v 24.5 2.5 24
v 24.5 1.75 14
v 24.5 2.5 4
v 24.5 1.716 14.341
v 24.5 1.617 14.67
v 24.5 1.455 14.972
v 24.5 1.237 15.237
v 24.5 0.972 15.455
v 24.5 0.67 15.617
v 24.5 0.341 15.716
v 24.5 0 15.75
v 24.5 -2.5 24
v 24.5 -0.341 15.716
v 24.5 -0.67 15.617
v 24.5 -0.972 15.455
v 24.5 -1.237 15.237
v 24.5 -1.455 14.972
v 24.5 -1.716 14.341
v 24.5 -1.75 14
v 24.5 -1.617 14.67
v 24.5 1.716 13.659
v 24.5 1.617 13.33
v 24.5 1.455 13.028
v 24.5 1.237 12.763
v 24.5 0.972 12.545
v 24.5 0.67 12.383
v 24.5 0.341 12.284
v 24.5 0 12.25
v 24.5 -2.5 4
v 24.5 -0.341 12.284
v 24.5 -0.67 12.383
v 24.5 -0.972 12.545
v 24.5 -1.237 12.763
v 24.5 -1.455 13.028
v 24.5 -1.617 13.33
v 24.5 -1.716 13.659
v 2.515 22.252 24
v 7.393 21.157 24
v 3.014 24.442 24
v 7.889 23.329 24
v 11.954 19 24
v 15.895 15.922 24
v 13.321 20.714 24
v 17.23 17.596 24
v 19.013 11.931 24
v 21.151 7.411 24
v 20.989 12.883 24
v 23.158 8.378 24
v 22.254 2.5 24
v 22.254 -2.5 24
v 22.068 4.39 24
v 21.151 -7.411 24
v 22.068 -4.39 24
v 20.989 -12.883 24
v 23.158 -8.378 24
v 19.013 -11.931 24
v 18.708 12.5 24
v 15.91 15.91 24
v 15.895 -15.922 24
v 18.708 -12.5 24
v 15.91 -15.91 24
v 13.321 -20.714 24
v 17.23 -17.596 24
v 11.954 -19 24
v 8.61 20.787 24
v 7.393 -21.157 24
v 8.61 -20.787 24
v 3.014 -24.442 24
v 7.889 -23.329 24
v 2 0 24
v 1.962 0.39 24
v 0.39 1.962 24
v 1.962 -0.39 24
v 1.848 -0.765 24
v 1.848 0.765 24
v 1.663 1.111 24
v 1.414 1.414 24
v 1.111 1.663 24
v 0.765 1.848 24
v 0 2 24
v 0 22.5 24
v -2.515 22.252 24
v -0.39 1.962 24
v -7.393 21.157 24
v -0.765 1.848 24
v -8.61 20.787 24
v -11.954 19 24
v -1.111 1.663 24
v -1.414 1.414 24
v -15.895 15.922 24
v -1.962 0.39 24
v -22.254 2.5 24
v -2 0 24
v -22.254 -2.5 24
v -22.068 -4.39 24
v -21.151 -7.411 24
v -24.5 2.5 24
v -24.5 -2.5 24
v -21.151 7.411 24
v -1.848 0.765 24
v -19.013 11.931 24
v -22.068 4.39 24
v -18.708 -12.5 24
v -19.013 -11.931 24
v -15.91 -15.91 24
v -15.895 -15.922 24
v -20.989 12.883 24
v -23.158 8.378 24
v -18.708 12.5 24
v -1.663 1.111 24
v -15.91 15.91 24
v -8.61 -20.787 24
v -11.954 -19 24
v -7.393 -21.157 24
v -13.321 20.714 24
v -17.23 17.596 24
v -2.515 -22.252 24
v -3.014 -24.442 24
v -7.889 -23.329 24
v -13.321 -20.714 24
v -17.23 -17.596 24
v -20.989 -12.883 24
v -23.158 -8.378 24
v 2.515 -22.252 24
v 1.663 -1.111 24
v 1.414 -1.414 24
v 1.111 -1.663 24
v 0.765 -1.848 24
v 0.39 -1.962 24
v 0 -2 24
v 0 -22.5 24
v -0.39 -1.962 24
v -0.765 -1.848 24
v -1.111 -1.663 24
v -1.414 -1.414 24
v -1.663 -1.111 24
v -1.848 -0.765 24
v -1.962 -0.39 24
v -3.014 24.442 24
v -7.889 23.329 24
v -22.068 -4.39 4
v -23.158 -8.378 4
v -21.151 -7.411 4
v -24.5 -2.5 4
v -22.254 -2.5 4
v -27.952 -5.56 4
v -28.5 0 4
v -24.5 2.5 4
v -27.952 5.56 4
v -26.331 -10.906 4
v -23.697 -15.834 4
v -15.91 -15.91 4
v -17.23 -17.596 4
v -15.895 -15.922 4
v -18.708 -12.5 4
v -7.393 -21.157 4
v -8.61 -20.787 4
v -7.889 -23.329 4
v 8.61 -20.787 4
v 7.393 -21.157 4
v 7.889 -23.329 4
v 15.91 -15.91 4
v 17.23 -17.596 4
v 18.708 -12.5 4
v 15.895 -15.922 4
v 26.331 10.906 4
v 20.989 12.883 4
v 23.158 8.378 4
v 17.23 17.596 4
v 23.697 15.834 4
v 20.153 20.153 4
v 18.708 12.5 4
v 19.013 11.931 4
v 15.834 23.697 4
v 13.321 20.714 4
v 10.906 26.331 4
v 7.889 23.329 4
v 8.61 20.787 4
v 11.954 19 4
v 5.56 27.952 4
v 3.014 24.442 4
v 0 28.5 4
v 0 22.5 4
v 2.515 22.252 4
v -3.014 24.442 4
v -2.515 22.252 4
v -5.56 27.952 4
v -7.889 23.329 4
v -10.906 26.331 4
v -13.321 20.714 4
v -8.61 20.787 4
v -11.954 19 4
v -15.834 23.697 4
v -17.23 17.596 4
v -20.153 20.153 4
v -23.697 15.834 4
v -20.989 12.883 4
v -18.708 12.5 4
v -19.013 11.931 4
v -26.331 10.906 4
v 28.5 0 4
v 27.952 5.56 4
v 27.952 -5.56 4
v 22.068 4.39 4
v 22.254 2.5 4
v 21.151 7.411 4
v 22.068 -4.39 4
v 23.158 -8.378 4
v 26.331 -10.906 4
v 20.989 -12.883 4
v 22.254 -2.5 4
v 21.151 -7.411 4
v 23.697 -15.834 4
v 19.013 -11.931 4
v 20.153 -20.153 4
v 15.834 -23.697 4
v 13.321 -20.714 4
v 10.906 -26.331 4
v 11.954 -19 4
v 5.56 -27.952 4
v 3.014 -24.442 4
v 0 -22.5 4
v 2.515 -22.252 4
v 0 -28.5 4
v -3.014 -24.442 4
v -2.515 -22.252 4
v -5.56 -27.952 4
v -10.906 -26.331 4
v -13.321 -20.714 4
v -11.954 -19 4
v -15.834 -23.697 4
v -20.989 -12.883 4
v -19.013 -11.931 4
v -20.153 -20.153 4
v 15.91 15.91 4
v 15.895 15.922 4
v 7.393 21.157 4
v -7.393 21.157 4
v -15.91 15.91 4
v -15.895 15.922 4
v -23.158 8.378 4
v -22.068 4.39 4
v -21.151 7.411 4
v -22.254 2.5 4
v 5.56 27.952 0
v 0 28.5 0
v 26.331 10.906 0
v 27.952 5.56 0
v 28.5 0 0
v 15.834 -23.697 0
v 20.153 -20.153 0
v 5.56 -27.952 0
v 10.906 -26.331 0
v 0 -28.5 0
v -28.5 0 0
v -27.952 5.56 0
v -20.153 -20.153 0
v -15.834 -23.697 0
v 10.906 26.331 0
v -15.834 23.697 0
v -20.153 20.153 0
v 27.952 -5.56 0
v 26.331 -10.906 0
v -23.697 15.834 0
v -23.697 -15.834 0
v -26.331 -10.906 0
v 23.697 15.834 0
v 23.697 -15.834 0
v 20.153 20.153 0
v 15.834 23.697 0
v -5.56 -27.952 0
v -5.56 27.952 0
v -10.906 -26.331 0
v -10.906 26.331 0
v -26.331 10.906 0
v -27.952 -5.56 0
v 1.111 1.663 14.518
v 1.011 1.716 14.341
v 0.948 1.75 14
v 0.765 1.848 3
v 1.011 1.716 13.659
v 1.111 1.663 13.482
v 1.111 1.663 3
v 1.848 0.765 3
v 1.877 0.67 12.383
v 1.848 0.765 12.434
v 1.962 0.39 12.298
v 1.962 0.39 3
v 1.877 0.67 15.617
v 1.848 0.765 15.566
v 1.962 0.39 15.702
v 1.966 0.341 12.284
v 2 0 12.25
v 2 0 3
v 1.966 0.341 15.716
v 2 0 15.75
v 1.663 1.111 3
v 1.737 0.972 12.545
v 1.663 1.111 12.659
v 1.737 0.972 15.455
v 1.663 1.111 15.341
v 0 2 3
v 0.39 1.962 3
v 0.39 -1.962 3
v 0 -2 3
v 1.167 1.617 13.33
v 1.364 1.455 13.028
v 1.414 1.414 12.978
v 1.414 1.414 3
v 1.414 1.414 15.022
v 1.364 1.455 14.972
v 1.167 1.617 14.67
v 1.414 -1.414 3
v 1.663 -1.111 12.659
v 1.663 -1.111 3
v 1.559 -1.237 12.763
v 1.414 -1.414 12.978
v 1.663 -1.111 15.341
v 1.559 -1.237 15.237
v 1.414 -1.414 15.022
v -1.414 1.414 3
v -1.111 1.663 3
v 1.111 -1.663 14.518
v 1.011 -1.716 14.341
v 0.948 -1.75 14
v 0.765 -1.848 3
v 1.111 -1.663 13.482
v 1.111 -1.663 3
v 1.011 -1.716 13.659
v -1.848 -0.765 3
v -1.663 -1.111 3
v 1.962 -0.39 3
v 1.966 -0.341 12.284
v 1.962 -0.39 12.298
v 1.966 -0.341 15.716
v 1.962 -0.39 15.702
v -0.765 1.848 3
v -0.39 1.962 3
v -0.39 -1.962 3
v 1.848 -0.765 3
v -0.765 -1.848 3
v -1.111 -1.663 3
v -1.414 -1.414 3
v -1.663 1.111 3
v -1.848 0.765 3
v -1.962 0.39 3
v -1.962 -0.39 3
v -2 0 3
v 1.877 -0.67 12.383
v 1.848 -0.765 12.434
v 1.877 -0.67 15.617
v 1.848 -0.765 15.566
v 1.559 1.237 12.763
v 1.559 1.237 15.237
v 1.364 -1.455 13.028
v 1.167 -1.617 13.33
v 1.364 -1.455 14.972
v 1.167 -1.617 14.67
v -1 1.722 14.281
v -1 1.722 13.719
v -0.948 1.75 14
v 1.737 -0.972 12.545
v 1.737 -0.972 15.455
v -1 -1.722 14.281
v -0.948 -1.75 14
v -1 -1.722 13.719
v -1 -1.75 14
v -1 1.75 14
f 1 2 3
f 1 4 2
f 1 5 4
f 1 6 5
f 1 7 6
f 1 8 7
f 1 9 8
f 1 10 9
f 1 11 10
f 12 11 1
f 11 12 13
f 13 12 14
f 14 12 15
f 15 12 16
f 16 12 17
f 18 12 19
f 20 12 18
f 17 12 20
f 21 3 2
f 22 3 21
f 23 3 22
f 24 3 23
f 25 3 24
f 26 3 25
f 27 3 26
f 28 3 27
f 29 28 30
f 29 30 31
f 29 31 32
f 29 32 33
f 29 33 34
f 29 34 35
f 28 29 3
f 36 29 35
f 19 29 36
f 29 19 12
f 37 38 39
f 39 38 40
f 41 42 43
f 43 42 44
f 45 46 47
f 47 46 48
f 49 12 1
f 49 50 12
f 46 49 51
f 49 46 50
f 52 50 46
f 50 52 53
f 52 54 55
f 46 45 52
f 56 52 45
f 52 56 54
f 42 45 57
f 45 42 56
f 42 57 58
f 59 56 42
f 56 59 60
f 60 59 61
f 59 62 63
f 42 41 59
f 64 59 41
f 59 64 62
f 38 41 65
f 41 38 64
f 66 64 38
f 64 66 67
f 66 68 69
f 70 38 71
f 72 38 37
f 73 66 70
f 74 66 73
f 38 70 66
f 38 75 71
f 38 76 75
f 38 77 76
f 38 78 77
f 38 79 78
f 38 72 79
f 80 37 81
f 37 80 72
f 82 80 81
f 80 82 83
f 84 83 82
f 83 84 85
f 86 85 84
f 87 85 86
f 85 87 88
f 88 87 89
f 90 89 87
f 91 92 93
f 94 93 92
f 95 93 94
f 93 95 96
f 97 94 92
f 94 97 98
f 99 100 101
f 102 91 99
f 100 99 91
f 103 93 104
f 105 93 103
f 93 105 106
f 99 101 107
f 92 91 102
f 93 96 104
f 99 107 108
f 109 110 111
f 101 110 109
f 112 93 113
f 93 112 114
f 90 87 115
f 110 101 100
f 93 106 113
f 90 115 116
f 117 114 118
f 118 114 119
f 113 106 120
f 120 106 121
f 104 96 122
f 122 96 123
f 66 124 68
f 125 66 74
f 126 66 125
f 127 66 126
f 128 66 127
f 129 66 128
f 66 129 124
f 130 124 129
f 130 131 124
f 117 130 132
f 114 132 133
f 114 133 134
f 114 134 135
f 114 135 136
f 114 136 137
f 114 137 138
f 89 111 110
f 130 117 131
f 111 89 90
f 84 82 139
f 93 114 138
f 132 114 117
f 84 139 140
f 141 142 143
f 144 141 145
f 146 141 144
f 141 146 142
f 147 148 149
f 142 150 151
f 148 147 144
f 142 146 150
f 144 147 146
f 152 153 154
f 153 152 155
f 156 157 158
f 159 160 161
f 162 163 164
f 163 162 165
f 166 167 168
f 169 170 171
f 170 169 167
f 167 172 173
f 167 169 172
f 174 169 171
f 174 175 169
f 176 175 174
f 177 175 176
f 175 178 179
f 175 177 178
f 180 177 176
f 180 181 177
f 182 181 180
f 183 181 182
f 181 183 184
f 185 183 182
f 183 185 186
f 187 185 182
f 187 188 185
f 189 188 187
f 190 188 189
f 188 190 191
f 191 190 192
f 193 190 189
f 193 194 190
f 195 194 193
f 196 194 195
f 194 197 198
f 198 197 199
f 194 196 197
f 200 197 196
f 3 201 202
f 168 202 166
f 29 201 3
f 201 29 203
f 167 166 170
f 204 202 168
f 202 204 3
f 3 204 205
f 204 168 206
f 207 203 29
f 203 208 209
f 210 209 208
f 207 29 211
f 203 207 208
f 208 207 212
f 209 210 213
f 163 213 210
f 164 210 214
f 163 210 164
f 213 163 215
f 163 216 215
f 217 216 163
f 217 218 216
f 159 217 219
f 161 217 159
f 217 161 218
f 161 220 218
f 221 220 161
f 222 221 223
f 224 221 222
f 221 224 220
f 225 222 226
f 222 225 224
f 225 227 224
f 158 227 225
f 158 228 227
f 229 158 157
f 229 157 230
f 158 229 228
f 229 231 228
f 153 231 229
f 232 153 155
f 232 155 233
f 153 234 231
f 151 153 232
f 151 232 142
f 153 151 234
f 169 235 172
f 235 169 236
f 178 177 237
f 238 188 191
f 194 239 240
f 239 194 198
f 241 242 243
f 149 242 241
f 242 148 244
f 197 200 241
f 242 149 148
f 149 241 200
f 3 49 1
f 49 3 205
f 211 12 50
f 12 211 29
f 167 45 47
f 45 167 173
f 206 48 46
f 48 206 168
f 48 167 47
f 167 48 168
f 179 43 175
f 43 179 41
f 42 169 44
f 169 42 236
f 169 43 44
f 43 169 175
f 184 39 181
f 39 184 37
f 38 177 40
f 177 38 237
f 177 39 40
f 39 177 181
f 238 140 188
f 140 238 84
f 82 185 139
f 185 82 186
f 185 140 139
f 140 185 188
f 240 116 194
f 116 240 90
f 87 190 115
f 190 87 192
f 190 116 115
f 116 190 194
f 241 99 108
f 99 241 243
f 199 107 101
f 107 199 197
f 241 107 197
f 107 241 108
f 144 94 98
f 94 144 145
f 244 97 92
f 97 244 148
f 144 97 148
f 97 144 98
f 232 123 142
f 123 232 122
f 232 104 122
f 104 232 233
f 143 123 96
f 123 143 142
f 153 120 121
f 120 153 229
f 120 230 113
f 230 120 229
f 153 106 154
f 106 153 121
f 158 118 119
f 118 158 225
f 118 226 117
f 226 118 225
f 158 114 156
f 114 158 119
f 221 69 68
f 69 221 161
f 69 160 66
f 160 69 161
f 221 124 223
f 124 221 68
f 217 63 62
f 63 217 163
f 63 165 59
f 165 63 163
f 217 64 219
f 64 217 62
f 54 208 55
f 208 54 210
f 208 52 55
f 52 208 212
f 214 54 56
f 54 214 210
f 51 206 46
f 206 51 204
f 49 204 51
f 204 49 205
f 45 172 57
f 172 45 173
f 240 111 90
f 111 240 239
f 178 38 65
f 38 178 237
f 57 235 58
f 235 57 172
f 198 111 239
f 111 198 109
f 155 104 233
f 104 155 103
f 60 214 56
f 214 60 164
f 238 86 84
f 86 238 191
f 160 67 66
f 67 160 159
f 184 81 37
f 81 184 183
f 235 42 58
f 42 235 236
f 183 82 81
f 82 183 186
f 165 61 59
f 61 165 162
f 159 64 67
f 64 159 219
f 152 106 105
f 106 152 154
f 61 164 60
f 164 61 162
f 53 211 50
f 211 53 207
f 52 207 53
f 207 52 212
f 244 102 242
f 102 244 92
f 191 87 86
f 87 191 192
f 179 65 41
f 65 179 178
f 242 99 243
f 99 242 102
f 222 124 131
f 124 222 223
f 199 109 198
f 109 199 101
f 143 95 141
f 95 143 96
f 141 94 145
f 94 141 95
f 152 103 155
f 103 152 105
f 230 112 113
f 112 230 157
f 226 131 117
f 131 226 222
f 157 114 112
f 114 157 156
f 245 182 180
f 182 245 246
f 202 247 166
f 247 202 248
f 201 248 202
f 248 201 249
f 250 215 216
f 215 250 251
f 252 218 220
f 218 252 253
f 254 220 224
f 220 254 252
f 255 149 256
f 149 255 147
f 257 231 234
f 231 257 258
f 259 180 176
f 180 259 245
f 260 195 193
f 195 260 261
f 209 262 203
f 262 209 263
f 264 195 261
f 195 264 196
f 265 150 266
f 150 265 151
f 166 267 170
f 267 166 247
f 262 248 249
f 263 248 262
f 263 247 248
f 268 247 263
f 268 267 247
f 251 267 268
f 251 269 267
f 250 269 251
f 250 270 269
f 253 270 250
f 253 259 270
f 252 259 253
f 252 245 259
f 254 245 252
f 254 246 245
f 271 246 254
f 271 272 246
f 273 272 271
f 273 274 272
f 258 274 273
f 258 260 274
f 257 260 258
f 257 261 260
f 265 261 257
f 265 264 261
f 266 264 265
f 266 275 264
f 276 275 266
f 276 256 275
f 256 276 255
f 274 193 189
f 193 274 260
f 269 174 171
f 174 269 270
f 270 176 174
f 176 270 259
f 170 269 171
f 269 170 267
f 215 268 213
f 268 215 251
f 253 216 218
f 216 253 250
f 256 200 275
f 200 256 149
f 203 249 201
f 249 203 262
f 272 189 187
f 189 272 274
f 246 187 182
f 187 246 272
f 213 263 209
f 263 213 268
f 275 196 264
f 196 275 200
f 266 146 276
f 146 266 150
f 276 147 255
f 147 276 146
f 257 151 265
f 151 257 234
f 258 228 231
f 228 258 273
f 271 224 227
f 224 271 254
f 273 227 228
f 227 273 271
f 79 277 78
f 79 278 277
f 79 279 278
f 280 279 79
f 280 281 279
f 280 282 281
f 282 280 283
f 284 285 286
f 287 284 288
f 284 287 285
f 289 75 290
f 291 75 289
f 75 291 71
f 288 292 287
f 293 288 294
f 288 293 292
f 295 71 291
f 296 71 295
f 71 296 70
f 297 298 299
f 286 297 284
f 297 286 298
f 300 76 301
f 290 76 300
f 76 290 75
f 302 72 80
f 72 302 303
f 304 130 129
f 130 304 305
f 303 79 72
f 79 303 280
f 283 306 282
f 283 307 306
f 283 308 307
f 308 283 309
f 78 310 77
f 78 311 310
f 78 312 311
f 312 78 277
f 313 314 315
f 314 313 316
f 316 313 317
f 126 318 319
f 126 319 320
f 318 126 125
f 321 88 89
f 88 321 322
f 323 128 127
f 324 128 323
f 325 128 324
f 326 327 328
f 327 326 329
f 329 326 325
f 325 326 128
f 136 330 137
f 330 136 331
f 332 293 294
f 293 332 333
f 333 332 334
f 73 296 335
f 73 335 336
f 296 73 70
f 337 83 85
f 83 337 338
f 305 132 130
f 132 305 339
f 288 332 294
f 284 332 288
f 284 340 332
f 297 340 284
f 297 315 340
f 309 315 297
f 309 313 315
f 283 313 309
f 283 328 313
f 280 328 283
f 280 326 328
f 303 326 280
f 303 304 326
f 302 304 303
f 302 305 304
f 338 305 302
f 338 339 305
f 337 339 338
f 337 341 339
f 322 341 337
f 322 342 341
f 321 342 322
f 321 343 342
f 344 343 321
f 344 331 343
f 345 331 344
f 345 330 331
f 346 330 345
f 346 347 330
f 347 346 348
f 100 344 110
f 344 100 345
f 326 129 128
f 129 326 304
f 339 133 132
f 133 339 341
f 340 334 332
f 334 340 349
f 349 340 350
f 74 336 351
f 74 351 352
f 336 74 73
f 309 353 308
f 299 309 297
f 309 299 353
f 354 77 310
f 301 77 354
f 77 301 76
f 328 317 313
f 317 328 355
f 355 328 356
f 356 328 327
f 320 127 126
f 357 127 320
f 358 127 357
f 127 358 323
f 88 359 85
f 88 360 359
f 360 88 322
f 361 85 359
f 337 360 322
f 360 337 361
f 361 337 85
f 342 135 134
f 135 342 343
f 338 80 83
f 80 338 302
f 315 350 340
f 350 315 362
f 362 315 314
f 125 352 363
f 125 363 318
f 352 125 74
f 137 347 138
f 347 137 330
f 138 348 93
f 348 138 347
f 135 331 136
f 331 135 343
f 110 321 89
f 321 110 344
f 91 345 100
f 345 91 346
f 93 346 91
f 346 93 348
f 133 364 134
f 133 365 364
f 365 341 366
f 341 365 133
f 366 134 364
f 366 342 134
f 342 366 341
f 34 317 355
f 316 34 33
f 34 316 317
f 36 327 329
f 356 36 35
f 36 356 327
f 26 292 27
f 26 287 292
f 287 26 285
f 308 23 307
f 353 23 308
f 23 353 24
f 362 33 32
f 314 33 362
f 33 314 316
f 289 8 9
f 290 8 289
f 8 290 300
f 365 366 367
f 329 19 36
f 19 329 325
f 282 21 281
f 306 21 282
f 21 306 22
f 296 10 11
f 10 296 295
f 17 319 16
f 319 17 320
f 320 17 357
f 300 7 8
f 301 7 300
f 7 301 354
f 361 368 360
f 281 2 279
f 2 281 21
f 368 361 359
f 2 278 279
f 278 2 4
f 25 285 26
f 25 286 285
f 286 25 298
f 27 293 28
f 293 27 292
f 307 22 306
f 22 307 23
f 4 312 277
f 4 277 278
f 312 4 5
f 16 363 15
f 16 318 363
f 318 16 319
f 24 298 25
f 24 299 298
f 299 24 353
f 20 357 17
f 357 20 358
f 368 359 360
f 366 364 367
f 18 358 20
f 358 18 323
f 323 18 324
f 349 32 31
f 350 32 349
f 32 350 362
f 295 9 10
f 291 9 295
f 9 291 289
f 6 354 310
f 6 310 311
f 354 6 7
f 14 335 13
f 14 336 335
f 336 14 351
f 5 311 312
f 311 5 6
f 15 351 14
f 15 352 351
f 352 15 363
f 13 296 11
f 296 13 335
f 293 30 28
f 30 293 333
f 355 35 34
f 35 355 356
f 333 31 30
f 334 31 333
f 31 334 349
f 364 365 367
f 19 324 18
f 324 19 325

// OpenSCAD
$fn = 32;

// ----------------------------------------------------------------------
// Control knob: skirt knob with grip ribs
// ----------------------------------------------------------------------

// --- parameters (mm) ---
skirt_d = 57;             // skirt diameter
skirt_t = 4;              // skirt thickness
rib_w = 5;                // grip rib width
rib_out = 3;              // grip rib radial protrusion
n_ribs = 14;              // number of grip ribs
knob_d = 45;              // knob body diameter
knob_h = 20;              // knob body height
bore_d = 4;               // shaft bore diameter
set_d = 3.5;              // set screw bore diameter

rib_step = 360 / n_ribs;  // rib angular step
total_h = skirt_t + knob_h;  // overall height

difference() {
  union() {
    translate([0, 0, skirt_t]) cylinder(h = knob_h, d = knob_d);
    cylinder(h = skirt_t, d = skirt_d);
    for (i = [0 : n_ribs - 1])
      rotate([0, 0, i * rib_step])
        translate([knob_d / 2 - 1, -rib_w / 2, skirt_t])
          cube([rib_out, rib_w, knob_h]);
  }
  translate([0, 0, skirt_t - 1]) cylinder(h = knob_h + 2, d = bore_d);
  translate([-1, 0, skirt_t + knob_h / 2]) rotate([0, 90, 0])
    cylinder(h = knob_d / 2 + bore_d / 2 + 2, d = set_d);
}
